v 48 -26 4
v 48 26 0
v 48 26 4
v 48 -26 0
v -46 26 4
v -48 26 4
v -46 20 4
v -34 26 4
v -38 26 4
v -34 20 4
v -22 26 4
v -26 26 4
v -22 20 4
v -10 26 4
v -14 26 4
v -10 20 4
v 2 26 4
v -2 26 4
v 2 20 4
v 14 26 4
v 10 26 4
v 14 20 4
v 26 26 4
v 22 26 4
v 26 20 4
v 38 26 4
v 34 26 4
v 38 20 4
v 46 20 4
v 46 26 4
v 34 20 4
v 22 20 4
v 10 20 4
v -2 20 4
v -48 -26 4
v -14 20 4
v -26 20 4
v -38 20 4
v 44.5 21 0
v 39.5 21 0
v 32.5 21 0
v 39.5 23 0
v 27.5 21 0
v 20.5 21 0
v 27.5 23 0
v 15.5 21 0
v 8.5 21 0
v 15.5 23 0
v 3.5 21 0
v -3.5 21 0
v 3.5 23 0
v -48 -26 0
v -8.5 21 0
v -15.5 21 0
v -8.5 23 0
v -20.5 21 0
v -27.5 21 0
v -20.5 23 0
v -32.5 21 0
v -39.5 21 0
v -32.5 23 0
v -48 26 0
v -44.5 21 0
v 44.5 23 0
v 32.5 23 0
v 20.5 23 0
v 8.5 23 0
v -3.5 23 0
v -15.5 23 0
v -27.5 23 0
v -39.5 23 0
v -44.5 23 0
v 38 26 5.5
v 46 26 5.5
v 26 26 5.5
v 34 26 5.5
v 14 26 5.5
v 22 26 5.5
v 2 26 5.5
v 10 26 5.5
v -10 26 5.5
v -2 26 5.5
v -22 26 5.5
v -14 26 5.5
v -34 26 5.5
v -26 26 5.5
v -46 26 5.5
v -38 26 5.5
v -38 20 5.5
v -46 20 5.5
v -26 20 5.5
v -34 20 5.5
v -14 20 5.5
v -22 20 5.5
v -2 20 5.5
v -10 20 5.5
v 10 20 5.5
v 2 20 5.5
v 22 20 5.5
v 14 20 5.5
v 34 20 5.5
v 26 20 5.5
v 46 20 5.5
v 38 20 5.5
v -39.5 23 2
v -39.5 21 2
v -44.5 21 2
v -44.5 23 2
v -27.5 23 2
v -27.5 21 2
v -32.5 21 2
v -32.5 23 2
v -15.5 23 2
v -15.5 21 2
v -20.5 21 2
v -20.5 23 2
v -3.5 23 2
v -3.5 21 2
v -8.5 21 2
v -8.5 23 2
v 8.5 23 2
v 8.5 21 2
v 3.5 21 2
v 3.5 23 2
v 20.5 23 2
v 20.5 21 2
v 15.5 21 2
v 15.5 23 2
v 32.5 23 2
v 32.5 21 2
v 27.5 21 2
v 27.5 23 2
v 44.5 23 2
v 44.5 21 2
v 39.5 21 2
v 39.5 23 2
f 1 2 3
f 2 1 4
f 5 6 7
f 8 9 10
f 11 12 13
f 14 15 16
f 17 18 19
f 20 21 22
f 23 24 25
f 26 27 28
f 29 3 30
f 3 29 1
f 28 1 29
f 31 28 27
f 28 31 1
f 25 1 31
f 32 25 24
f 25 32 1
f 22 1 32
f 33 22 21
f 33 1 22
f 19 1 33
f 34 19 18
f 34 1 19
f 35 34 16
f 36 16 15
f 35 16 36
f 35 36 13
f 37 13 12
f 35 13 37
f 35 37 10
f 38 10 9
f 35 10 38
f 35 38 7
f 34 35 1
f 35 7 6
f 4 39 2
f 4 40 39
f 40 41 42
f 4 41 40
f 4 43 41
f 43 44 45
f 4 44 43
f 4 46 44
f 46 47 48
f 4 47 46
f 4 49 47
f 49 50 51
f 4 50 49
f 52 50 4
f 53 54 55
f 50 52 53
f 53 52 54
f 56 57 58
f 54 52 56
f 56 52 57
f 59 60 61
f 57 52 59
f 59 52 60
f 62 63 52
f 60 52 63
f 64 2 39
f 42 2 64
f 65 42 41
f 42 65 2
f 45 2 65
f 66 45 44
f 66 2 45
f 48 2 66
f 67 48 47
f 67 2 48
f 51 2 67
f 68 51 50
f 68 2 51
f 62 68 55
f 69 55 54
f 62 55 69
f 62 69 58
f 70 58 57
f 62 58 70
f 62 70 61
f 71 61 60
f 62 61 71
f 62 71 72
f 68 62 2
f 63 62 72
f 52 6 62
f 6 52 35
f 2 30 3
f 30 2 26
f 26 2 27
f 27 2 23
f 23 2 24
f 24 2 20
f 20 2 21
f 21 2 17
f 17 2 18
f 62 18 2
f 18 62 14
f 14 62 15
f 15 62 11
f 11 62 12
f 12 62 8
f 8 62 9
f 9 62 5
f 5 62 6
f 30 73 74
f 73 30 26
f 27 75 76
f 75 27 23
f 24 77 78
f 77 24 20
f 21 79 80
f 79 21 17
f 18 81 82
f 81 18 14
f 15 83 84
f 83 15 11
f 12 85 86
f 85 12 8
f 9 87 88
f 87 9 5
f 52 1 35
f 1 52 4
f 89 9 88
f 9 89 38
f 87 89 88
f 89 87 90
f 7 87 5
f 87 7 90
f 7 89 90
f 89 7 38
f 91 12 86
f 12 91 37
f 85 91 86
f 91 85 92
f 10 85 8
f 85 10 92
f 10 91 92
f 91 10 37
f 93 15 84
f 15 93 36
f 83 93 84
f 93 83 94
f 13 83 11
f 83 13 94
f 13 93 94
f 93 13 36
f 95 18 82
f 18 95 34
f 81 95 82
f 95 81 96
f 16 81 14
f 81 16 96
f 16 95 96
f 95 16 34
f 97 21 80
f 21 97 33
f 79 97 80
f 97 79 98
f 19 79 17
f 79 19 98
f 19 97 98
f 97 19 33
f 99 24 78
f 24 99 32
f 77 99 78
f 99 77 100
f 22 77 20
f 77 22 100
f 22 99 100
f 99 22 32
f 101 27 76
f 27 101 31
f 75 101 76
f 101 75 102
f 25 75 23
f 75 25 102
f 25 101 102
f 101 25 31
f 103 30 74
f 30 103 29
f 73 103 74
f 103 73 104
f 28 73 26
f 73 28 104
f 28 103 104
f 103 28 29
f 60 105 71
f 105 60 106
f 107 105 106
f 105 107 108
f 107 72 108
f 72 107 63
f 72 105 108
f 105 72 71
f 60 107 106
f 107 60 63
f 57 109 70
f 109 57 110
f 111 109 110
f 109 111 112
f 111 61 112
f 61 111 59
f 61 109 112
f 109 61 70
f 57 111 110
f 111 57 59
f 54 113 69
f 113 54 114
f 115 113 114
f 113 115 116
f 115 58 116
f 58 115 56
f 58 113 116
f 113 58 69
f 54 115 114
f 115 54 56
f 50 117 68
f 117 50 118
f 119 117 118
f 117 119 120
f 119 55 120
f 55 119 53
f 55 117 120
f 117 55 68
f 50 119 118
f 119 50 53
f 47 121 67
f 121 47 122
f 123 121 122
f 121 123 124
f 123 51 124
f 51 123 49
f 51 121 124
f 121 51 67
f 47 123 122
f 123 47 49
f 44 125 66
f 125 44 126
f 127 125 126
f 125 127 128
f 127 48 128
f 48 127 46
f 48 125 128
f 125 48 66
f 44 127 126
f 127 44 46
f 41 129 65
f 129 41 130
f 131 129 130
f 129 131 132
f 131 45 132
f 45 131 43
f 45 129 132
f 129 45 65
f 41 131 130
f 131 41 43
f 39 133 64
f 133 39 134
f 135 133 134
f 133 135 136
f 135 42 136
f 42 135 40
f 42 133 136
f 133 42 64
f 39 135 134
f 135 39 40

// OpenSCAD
// Generated with SolidPython2 for OpenSCAD task-029
$fn = 64;

difference() {
	union() {
		translate(v = [-48.0, -26.0, 0]) {
			cube(size = [96, 52, 4]);
		}
		translate(v = [-42, 23, 4]) {
			cube(center = true, size = [8, 6, 3]);
		}
		translate(v = [-30, 23, 4]) {
			cube(center = true, size = [8, 6, 3]);
		}
		translate(v = [-18, 23, 4]) {
			cube(center = true, size = [8, 6, 3]);
		}
		translate(v = [-6, 23, 4]) {
			cube(center = true, size = [8, 6, 3]);
		}
		translate(v = [6, 23, 4]) {
			cube(center = true, size = [8, 6, 3]);
		}
		translate(v = [18, 23, 4]) {
			cube(center = true, size = [8, 6, 3]);
		}
		translate(v = [30, 23, 4]) {
			cube(center = true, size = [8, 6, 3]);
		}
		translate(v = [42, 23, 4]) {
			cube(center = true, size = [8, 6, 3]);
		}
	}
	translate(v = [-42, 22, -1]) {
		cube(center = true, size = [5, 2, 6]);
	}
	translate(v = [-30, 22, -1]) {
		cube(center = true, size = [5, 2, 6]);
	}
	translate(v = [-18, 22, -1]) {
		cube(center = true, size = [5, 2, 6]);
	}
	translate(v = [-6, 22, -1]) {
		cube(center = true, size = [5, 2, 6]);
	}
	translate(v = [6, 22, -1]) {
		cube(center = true, size = [5, 2, 6]);
	}
	translate(v = [18, 22, -1]) {
		cube(center = true, size = [5, 2, 6]);
	}
	translate(v = [30, 22, -1]) {
		cube(center = true, size = [5, 2, 6]);
	}
	translate(v = [42, 22, -1]) {
		cube(center = true, size = [5, 2, 6]);
	}
}
